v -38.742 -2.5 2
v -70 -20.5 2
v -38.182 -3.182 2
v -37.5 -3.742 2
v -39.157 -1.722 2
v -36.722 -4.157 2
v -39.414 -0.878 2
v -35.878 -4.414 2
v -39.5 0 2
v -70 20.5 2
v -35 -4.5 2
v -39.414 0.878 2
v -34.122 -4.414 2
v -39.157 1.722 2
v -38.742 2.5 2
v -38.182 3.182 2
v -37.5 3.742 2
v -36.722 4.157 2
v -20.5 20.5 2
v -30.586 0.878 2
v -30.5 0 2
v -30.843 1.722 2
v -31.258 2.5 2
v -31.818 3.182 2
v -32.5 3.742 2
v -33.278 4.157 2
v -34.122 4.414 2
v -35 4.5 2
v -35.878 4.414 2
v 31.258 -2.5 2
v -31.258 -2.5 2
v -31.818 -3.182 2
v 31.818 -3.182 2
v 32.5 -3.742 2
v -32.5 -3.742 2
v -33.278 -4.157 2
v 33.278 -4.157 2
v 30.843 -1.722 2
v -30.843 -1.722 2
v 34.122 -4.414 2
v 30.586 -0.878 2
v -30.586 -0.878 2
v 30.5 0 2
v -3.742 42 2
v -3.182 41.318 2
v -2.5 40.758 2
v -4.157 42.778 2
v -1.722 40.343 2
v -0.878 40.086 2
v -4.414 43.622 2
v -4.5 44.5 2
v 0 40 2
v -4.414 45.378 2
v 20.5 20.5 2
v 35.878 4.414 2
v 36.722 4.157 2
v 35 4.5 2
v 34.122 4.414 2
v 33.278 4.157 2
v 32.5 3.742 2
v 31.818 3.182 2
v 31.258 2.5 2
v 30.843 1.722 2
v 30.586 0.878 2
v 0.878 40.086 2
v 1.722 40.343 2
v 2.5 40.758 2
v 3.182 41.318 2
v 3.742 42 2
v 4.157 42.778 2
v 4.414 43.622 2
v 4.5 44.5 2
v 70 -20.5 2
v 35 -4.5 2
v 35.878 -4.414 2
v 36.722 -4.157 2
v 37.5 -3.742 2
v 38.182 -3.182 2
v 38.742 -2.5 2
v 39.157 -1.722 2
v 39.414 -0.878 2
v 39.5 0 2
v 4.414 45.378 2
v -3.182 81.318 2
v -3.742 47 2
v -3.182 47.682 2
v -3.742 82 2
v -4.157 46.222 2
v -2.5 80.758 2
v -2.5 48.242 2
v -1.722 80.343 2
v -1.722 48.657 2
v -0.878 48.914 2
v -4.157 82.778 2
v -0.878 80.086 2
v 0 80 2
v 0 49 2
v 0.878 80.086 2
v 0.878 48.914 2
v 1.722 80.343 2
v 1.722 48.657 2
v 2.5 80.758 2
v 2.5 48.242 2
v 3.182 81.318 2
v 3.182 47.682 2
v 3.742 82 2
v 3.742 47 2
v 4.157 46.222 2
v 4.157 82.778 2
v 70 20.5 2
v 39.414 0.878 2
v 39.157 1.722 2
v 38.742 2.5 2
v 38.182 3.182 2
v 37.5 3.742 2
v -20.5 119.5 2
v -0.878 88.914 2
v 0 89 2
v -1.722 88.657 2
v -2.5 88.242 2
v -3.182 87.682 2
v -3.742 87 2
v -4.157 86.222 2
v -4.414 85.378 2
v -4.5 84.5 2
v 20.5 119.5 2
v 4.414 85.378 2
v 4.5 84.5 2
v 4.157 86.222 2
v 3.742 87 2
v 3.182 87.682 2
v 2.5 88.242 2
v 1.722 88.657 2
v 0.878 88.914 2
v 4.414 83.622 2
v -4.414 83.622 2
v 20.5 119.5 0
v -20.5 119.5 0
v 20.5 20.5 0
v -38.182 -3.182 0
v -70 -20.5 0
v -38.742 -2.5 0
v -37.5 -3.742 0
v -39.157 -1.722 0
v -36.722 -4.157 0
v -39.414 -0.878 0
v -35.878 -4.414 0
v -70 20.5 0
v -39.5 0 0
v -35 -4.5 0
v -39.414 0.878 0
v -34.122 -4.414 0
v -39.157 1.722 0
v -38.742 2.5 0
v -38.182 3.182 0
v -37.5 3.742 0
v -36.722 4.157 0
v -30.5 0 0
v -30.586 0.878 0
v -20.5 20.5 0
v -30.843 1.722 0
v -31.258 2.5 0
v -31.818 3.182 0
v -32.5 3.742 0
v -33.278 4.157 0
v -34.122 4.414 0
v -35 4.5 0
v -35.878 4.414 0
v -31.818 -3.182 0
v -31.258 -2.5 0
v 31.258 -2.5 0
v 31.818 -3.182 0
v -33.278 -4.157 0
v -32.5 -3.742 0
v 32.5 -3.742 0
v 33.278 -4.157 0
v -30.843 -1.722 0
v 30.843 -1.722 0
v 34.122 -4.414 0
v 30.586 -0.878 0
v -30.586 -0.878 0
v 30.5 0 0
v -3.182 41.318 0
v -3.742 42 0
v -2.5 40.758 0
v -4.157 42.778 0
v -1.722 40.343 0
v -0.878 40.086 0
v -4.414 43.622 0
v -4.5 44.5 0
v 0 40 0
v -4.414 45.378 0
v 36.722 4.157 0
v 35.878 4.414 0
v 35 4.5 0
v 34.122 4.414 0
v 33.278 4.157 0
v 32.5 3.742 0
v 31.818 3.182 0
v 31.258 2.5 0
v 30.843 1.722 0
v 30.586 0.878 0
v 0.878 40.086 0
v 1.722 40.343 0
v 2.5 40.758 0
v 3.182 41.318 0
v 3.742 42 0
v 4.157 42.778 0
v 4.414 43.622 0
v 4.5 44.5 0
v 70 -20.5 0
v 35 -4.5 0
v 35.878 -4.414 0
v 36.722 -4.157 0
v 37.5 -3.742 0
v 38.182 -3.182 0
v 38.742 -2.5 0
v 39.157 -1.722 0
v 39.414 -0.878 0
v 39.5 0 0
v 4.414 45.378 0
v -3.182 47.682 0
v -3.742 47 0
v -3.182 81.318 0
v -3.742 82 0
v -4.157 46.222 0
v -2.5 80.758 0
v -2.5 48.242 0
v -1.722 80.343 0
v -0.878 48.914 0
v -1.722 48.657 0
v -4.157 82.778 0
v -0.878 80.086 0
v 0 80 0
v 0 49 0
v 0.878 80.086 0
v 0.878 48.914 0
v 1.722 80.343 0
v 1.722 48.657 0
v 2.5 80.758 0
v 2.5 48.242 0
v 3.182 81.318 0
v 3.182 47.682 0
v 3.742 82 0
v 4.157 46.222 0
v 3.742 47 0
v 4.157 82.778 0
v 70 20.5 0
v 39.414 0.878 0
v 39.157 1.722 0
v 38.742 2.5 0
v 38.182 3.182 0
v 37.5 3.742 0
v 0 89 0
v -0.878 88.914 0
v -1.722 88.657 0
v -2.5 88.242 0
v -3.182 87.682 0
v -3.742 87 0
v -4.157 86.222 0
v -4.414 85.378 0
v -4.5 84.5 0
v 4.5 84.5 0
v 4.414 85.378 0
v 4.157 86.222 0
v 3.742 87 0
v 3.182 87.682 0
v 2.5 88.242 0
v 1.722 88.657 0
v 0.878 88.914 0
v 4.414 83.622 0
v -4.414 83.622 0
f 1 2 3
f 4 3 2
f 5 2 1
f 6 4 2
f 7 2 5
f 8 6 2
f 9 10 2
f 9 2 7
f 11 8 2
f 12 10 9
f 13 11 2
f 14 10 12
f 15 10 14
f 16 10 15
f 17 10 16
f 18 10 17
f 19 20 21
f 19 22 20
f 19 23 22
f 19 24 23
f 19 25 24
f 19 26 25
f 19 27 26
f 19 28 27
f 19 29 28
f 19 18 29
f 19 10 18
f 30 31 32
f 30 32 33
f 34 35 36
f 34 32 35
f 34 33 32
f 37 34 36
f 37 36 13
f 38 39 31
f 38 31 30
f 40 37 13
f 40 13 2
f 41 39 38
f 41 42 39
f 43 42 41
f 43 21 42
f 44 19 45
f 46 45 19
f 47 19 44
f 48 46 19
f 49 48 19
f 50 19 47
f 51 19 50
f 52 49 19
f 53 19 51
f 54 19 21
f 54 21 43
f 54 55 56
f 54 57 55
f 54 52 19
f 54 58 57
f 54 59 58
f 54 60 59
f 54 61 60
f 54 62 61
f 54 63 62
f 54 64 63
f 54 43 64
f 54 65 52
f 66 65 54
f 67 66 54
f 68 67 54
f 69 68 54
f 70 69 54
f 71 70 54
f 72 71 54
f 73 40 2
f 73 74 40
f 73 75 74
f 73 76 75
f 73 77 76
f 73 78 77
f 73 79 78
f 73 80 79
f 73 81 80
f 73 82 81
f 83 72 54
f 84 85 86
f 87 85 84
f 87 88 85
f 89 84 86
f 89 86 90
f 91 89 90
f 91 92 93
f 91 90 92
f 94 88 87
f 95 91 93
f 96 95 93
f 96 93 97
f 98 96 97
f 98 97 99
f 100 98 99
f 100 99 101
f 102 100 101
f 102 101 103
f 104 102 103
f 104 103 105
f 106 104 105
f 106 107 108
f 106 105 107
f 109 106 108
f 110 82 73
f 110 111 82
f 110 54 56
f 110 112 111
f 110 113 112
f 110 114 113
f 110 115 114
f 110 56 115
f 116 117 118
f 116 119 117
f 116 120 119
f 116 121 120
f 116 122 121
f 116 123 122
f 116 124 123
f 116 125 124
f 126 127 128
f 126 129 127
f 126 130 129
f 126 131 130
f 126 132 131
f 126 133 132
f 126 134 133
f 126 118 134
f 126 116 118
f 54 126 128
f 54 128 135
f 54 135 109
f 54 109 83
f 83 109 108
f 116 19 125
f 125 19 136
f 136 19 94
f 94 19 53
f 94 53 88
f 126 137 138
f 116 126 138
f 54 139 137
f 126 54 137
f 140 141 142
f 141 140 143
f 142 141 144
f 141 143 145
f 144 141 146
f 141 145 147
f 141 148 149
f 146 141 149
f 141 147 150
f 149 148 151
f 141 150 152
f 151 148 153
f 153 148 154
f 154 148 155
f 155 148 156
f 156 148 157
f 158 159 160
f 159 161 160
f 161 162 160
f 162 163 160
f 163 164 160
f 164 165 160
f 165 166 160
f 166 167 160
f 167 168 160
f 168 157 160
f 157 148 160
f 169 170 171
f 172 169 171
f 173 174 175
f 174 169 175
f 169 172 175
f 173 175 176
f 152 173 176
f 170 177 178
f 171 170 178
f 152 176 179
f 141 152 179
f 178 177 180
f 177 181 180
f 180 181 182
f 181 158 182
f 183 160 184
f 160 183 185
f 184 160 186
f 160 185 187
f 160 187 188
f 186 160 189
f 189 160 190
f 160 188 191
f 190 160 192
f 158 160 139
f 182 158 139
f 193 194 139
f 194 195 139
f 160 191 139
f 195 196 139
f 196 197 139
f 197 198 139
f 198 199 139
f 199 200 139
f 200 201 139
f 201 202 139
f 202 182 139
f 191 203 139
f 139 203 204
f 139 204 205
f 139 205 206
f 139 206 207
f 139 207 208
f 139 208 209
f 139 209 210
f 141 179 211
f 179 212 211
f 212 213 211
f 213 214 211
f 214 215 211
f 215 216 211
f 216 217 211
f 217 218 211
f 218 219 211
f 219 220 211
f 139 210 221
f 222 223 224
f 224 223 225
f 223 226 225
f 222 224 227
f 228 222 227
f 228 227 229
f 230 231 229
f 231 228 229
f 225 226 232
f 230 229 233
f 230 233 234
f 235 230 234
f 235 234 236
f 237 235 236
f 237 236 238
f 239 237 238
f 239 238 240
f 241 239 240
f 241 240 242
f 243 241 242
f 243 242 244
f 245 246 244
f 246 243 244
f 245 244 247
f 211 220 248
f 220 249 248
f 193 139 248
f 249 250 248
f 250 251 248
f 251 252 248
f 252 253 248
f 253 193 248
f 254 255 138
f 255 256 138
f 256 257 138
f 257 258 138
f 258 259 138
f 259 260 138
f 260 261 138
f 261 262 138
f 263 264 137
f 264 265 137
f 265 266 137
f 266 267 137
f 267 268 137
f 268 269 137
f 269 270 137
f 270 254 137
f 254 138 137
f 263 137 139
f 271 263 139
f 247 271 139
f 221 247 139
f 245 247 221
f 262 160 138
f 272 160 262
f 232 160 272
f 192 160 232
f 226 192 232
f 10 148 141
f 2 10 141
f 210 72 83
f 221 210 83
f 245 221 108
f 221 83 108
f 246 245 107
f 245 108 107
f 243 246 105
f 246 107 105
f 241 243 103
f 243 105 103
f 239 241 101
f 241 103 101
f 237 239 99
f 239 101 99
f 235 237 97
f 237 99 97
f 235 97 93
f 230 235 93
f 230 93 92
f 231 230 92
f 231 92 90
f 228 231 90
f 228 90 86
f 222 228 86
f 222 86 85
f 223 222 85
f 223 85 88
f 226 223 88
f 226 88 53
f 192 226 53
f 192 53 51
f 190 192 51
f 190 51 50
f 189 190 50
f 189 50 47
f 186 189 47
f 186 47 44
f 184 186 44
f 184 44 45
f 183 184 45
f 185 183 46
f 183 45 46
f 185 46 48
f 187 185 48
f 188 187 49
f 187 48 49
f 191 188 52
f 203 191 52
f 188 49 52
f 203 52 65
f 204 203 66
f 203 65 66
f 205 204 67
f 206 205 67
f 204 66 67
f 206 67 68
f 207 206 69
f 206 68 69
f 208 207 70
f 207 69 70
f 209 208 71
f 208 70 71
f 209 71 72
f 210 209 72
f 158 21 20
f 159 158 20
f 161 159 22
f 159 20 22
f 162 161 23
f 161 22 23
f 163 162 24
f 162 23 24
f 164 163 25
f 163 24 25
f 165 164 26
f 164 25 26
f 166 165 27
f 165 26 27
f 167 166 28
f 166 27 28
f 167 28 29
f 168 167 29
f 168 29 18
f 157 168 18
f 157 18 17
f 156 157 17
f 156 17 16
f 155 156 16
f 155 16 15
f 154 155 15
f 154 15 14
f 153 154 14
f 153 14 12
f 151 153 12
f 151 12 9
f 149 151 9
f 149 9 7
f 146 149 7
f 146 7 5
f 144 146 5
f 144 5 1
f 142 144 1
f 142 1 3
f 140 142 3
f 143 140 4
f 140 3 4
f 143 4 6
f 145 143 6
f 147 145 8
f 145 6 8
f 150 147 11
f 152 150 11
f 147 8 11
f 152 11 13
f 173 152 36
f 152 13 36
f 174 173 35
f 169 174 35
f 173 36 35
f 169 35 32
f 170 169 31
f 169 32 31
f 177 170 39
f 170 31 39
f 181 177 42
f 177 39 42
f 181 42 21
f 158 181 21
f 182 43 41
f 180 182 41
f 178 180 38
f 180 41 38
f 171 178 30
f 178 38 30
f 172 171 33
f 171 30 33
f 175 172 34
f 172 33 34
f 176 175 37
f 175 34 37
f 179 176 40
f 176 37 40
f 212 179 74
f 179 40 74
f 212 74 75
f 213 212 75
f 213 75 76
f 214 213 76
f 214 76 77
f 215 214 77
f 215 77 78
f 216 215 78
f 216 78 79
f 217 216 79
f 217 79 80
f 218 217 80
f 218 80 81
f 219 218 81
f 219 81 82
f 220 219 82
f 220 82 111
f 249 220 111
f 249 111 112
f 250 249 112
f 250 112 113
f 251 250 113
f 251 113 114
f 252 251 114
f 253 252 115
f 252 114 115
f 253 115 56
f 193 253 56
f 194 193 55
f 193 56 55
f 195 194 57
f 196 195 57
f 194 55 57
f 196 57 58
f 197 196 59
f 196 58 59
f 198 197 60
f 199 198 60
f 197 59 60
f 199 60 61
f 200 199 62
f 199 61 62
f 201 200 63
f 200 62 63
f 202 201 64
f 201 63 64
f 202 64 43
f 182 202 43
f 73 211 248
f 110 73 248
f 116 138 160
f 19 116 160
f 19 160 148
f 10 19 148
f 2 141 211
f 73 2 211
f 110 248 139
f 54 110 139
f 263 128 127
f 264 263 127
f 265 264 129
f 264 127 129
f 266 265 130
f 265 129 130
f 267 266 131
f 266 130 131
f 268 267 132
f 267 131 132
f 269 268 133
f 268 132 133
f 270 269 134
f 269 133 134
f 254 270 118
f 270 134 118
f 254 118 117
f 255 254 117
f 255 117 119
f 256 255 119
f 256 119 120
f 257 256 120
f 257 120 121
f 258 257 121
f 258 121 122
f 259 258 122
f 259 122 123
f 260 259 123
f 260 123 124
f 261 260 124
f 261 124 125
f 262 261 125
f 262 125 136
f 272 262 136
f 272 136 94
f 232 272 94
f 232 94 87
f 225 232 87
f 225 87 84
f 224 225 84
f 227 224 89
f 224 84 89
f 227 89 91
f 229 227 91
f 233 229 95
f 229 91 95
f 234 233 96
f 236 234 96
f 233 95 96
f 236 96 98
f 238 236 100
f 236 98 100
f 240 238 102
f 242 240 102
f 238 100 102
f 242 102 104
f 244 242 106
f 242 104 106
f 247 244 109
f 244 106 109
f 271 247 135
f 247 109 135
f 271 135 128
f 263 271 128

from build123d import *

# Parameters (mm, degrees)
EXTRUDE_1_DEPTH     = 2
SKETCH_2_R          = 4.5
CUT_EXTRUDE_1_DEPTH = 139.507220028


with BuildPart() as part:
    # 草图1 → 凸台-拉伸1 (new body)
    with BuildSketch(Plane.XY):
        Polygon((-70, -20.5), (70, -20.5), (70, 20.5), (20.5, 20.5), (20.5, 119.5), (-20.5, 119.5), (-20.5, 20.5), (-70, 20.5), align=None)
    extrude(amount=EXTRUDE_1_DEPTH)

    # 草图2 → 切除-拉伸1 (cut, through all)
    with BuildSketch(Plane.XY.offset(2)):
        with Locations((0, 84.5)):
            Circle(SKETCH_2_R)
        with Locations((0, 44.5)):
            Circle(SKETCH_2_R)
        with Locations((-35, 0)):
            Circle(SKETCH_2_R)
        with Locations(Location((35, 0, 0), (0, 0, 180))):
            Circle(SKETCH_2_R)
    extrude(amount=-CUT_EXTRUDE_1_DEPTH, mode=Mode.SUBTRACT)


solid = part.part
